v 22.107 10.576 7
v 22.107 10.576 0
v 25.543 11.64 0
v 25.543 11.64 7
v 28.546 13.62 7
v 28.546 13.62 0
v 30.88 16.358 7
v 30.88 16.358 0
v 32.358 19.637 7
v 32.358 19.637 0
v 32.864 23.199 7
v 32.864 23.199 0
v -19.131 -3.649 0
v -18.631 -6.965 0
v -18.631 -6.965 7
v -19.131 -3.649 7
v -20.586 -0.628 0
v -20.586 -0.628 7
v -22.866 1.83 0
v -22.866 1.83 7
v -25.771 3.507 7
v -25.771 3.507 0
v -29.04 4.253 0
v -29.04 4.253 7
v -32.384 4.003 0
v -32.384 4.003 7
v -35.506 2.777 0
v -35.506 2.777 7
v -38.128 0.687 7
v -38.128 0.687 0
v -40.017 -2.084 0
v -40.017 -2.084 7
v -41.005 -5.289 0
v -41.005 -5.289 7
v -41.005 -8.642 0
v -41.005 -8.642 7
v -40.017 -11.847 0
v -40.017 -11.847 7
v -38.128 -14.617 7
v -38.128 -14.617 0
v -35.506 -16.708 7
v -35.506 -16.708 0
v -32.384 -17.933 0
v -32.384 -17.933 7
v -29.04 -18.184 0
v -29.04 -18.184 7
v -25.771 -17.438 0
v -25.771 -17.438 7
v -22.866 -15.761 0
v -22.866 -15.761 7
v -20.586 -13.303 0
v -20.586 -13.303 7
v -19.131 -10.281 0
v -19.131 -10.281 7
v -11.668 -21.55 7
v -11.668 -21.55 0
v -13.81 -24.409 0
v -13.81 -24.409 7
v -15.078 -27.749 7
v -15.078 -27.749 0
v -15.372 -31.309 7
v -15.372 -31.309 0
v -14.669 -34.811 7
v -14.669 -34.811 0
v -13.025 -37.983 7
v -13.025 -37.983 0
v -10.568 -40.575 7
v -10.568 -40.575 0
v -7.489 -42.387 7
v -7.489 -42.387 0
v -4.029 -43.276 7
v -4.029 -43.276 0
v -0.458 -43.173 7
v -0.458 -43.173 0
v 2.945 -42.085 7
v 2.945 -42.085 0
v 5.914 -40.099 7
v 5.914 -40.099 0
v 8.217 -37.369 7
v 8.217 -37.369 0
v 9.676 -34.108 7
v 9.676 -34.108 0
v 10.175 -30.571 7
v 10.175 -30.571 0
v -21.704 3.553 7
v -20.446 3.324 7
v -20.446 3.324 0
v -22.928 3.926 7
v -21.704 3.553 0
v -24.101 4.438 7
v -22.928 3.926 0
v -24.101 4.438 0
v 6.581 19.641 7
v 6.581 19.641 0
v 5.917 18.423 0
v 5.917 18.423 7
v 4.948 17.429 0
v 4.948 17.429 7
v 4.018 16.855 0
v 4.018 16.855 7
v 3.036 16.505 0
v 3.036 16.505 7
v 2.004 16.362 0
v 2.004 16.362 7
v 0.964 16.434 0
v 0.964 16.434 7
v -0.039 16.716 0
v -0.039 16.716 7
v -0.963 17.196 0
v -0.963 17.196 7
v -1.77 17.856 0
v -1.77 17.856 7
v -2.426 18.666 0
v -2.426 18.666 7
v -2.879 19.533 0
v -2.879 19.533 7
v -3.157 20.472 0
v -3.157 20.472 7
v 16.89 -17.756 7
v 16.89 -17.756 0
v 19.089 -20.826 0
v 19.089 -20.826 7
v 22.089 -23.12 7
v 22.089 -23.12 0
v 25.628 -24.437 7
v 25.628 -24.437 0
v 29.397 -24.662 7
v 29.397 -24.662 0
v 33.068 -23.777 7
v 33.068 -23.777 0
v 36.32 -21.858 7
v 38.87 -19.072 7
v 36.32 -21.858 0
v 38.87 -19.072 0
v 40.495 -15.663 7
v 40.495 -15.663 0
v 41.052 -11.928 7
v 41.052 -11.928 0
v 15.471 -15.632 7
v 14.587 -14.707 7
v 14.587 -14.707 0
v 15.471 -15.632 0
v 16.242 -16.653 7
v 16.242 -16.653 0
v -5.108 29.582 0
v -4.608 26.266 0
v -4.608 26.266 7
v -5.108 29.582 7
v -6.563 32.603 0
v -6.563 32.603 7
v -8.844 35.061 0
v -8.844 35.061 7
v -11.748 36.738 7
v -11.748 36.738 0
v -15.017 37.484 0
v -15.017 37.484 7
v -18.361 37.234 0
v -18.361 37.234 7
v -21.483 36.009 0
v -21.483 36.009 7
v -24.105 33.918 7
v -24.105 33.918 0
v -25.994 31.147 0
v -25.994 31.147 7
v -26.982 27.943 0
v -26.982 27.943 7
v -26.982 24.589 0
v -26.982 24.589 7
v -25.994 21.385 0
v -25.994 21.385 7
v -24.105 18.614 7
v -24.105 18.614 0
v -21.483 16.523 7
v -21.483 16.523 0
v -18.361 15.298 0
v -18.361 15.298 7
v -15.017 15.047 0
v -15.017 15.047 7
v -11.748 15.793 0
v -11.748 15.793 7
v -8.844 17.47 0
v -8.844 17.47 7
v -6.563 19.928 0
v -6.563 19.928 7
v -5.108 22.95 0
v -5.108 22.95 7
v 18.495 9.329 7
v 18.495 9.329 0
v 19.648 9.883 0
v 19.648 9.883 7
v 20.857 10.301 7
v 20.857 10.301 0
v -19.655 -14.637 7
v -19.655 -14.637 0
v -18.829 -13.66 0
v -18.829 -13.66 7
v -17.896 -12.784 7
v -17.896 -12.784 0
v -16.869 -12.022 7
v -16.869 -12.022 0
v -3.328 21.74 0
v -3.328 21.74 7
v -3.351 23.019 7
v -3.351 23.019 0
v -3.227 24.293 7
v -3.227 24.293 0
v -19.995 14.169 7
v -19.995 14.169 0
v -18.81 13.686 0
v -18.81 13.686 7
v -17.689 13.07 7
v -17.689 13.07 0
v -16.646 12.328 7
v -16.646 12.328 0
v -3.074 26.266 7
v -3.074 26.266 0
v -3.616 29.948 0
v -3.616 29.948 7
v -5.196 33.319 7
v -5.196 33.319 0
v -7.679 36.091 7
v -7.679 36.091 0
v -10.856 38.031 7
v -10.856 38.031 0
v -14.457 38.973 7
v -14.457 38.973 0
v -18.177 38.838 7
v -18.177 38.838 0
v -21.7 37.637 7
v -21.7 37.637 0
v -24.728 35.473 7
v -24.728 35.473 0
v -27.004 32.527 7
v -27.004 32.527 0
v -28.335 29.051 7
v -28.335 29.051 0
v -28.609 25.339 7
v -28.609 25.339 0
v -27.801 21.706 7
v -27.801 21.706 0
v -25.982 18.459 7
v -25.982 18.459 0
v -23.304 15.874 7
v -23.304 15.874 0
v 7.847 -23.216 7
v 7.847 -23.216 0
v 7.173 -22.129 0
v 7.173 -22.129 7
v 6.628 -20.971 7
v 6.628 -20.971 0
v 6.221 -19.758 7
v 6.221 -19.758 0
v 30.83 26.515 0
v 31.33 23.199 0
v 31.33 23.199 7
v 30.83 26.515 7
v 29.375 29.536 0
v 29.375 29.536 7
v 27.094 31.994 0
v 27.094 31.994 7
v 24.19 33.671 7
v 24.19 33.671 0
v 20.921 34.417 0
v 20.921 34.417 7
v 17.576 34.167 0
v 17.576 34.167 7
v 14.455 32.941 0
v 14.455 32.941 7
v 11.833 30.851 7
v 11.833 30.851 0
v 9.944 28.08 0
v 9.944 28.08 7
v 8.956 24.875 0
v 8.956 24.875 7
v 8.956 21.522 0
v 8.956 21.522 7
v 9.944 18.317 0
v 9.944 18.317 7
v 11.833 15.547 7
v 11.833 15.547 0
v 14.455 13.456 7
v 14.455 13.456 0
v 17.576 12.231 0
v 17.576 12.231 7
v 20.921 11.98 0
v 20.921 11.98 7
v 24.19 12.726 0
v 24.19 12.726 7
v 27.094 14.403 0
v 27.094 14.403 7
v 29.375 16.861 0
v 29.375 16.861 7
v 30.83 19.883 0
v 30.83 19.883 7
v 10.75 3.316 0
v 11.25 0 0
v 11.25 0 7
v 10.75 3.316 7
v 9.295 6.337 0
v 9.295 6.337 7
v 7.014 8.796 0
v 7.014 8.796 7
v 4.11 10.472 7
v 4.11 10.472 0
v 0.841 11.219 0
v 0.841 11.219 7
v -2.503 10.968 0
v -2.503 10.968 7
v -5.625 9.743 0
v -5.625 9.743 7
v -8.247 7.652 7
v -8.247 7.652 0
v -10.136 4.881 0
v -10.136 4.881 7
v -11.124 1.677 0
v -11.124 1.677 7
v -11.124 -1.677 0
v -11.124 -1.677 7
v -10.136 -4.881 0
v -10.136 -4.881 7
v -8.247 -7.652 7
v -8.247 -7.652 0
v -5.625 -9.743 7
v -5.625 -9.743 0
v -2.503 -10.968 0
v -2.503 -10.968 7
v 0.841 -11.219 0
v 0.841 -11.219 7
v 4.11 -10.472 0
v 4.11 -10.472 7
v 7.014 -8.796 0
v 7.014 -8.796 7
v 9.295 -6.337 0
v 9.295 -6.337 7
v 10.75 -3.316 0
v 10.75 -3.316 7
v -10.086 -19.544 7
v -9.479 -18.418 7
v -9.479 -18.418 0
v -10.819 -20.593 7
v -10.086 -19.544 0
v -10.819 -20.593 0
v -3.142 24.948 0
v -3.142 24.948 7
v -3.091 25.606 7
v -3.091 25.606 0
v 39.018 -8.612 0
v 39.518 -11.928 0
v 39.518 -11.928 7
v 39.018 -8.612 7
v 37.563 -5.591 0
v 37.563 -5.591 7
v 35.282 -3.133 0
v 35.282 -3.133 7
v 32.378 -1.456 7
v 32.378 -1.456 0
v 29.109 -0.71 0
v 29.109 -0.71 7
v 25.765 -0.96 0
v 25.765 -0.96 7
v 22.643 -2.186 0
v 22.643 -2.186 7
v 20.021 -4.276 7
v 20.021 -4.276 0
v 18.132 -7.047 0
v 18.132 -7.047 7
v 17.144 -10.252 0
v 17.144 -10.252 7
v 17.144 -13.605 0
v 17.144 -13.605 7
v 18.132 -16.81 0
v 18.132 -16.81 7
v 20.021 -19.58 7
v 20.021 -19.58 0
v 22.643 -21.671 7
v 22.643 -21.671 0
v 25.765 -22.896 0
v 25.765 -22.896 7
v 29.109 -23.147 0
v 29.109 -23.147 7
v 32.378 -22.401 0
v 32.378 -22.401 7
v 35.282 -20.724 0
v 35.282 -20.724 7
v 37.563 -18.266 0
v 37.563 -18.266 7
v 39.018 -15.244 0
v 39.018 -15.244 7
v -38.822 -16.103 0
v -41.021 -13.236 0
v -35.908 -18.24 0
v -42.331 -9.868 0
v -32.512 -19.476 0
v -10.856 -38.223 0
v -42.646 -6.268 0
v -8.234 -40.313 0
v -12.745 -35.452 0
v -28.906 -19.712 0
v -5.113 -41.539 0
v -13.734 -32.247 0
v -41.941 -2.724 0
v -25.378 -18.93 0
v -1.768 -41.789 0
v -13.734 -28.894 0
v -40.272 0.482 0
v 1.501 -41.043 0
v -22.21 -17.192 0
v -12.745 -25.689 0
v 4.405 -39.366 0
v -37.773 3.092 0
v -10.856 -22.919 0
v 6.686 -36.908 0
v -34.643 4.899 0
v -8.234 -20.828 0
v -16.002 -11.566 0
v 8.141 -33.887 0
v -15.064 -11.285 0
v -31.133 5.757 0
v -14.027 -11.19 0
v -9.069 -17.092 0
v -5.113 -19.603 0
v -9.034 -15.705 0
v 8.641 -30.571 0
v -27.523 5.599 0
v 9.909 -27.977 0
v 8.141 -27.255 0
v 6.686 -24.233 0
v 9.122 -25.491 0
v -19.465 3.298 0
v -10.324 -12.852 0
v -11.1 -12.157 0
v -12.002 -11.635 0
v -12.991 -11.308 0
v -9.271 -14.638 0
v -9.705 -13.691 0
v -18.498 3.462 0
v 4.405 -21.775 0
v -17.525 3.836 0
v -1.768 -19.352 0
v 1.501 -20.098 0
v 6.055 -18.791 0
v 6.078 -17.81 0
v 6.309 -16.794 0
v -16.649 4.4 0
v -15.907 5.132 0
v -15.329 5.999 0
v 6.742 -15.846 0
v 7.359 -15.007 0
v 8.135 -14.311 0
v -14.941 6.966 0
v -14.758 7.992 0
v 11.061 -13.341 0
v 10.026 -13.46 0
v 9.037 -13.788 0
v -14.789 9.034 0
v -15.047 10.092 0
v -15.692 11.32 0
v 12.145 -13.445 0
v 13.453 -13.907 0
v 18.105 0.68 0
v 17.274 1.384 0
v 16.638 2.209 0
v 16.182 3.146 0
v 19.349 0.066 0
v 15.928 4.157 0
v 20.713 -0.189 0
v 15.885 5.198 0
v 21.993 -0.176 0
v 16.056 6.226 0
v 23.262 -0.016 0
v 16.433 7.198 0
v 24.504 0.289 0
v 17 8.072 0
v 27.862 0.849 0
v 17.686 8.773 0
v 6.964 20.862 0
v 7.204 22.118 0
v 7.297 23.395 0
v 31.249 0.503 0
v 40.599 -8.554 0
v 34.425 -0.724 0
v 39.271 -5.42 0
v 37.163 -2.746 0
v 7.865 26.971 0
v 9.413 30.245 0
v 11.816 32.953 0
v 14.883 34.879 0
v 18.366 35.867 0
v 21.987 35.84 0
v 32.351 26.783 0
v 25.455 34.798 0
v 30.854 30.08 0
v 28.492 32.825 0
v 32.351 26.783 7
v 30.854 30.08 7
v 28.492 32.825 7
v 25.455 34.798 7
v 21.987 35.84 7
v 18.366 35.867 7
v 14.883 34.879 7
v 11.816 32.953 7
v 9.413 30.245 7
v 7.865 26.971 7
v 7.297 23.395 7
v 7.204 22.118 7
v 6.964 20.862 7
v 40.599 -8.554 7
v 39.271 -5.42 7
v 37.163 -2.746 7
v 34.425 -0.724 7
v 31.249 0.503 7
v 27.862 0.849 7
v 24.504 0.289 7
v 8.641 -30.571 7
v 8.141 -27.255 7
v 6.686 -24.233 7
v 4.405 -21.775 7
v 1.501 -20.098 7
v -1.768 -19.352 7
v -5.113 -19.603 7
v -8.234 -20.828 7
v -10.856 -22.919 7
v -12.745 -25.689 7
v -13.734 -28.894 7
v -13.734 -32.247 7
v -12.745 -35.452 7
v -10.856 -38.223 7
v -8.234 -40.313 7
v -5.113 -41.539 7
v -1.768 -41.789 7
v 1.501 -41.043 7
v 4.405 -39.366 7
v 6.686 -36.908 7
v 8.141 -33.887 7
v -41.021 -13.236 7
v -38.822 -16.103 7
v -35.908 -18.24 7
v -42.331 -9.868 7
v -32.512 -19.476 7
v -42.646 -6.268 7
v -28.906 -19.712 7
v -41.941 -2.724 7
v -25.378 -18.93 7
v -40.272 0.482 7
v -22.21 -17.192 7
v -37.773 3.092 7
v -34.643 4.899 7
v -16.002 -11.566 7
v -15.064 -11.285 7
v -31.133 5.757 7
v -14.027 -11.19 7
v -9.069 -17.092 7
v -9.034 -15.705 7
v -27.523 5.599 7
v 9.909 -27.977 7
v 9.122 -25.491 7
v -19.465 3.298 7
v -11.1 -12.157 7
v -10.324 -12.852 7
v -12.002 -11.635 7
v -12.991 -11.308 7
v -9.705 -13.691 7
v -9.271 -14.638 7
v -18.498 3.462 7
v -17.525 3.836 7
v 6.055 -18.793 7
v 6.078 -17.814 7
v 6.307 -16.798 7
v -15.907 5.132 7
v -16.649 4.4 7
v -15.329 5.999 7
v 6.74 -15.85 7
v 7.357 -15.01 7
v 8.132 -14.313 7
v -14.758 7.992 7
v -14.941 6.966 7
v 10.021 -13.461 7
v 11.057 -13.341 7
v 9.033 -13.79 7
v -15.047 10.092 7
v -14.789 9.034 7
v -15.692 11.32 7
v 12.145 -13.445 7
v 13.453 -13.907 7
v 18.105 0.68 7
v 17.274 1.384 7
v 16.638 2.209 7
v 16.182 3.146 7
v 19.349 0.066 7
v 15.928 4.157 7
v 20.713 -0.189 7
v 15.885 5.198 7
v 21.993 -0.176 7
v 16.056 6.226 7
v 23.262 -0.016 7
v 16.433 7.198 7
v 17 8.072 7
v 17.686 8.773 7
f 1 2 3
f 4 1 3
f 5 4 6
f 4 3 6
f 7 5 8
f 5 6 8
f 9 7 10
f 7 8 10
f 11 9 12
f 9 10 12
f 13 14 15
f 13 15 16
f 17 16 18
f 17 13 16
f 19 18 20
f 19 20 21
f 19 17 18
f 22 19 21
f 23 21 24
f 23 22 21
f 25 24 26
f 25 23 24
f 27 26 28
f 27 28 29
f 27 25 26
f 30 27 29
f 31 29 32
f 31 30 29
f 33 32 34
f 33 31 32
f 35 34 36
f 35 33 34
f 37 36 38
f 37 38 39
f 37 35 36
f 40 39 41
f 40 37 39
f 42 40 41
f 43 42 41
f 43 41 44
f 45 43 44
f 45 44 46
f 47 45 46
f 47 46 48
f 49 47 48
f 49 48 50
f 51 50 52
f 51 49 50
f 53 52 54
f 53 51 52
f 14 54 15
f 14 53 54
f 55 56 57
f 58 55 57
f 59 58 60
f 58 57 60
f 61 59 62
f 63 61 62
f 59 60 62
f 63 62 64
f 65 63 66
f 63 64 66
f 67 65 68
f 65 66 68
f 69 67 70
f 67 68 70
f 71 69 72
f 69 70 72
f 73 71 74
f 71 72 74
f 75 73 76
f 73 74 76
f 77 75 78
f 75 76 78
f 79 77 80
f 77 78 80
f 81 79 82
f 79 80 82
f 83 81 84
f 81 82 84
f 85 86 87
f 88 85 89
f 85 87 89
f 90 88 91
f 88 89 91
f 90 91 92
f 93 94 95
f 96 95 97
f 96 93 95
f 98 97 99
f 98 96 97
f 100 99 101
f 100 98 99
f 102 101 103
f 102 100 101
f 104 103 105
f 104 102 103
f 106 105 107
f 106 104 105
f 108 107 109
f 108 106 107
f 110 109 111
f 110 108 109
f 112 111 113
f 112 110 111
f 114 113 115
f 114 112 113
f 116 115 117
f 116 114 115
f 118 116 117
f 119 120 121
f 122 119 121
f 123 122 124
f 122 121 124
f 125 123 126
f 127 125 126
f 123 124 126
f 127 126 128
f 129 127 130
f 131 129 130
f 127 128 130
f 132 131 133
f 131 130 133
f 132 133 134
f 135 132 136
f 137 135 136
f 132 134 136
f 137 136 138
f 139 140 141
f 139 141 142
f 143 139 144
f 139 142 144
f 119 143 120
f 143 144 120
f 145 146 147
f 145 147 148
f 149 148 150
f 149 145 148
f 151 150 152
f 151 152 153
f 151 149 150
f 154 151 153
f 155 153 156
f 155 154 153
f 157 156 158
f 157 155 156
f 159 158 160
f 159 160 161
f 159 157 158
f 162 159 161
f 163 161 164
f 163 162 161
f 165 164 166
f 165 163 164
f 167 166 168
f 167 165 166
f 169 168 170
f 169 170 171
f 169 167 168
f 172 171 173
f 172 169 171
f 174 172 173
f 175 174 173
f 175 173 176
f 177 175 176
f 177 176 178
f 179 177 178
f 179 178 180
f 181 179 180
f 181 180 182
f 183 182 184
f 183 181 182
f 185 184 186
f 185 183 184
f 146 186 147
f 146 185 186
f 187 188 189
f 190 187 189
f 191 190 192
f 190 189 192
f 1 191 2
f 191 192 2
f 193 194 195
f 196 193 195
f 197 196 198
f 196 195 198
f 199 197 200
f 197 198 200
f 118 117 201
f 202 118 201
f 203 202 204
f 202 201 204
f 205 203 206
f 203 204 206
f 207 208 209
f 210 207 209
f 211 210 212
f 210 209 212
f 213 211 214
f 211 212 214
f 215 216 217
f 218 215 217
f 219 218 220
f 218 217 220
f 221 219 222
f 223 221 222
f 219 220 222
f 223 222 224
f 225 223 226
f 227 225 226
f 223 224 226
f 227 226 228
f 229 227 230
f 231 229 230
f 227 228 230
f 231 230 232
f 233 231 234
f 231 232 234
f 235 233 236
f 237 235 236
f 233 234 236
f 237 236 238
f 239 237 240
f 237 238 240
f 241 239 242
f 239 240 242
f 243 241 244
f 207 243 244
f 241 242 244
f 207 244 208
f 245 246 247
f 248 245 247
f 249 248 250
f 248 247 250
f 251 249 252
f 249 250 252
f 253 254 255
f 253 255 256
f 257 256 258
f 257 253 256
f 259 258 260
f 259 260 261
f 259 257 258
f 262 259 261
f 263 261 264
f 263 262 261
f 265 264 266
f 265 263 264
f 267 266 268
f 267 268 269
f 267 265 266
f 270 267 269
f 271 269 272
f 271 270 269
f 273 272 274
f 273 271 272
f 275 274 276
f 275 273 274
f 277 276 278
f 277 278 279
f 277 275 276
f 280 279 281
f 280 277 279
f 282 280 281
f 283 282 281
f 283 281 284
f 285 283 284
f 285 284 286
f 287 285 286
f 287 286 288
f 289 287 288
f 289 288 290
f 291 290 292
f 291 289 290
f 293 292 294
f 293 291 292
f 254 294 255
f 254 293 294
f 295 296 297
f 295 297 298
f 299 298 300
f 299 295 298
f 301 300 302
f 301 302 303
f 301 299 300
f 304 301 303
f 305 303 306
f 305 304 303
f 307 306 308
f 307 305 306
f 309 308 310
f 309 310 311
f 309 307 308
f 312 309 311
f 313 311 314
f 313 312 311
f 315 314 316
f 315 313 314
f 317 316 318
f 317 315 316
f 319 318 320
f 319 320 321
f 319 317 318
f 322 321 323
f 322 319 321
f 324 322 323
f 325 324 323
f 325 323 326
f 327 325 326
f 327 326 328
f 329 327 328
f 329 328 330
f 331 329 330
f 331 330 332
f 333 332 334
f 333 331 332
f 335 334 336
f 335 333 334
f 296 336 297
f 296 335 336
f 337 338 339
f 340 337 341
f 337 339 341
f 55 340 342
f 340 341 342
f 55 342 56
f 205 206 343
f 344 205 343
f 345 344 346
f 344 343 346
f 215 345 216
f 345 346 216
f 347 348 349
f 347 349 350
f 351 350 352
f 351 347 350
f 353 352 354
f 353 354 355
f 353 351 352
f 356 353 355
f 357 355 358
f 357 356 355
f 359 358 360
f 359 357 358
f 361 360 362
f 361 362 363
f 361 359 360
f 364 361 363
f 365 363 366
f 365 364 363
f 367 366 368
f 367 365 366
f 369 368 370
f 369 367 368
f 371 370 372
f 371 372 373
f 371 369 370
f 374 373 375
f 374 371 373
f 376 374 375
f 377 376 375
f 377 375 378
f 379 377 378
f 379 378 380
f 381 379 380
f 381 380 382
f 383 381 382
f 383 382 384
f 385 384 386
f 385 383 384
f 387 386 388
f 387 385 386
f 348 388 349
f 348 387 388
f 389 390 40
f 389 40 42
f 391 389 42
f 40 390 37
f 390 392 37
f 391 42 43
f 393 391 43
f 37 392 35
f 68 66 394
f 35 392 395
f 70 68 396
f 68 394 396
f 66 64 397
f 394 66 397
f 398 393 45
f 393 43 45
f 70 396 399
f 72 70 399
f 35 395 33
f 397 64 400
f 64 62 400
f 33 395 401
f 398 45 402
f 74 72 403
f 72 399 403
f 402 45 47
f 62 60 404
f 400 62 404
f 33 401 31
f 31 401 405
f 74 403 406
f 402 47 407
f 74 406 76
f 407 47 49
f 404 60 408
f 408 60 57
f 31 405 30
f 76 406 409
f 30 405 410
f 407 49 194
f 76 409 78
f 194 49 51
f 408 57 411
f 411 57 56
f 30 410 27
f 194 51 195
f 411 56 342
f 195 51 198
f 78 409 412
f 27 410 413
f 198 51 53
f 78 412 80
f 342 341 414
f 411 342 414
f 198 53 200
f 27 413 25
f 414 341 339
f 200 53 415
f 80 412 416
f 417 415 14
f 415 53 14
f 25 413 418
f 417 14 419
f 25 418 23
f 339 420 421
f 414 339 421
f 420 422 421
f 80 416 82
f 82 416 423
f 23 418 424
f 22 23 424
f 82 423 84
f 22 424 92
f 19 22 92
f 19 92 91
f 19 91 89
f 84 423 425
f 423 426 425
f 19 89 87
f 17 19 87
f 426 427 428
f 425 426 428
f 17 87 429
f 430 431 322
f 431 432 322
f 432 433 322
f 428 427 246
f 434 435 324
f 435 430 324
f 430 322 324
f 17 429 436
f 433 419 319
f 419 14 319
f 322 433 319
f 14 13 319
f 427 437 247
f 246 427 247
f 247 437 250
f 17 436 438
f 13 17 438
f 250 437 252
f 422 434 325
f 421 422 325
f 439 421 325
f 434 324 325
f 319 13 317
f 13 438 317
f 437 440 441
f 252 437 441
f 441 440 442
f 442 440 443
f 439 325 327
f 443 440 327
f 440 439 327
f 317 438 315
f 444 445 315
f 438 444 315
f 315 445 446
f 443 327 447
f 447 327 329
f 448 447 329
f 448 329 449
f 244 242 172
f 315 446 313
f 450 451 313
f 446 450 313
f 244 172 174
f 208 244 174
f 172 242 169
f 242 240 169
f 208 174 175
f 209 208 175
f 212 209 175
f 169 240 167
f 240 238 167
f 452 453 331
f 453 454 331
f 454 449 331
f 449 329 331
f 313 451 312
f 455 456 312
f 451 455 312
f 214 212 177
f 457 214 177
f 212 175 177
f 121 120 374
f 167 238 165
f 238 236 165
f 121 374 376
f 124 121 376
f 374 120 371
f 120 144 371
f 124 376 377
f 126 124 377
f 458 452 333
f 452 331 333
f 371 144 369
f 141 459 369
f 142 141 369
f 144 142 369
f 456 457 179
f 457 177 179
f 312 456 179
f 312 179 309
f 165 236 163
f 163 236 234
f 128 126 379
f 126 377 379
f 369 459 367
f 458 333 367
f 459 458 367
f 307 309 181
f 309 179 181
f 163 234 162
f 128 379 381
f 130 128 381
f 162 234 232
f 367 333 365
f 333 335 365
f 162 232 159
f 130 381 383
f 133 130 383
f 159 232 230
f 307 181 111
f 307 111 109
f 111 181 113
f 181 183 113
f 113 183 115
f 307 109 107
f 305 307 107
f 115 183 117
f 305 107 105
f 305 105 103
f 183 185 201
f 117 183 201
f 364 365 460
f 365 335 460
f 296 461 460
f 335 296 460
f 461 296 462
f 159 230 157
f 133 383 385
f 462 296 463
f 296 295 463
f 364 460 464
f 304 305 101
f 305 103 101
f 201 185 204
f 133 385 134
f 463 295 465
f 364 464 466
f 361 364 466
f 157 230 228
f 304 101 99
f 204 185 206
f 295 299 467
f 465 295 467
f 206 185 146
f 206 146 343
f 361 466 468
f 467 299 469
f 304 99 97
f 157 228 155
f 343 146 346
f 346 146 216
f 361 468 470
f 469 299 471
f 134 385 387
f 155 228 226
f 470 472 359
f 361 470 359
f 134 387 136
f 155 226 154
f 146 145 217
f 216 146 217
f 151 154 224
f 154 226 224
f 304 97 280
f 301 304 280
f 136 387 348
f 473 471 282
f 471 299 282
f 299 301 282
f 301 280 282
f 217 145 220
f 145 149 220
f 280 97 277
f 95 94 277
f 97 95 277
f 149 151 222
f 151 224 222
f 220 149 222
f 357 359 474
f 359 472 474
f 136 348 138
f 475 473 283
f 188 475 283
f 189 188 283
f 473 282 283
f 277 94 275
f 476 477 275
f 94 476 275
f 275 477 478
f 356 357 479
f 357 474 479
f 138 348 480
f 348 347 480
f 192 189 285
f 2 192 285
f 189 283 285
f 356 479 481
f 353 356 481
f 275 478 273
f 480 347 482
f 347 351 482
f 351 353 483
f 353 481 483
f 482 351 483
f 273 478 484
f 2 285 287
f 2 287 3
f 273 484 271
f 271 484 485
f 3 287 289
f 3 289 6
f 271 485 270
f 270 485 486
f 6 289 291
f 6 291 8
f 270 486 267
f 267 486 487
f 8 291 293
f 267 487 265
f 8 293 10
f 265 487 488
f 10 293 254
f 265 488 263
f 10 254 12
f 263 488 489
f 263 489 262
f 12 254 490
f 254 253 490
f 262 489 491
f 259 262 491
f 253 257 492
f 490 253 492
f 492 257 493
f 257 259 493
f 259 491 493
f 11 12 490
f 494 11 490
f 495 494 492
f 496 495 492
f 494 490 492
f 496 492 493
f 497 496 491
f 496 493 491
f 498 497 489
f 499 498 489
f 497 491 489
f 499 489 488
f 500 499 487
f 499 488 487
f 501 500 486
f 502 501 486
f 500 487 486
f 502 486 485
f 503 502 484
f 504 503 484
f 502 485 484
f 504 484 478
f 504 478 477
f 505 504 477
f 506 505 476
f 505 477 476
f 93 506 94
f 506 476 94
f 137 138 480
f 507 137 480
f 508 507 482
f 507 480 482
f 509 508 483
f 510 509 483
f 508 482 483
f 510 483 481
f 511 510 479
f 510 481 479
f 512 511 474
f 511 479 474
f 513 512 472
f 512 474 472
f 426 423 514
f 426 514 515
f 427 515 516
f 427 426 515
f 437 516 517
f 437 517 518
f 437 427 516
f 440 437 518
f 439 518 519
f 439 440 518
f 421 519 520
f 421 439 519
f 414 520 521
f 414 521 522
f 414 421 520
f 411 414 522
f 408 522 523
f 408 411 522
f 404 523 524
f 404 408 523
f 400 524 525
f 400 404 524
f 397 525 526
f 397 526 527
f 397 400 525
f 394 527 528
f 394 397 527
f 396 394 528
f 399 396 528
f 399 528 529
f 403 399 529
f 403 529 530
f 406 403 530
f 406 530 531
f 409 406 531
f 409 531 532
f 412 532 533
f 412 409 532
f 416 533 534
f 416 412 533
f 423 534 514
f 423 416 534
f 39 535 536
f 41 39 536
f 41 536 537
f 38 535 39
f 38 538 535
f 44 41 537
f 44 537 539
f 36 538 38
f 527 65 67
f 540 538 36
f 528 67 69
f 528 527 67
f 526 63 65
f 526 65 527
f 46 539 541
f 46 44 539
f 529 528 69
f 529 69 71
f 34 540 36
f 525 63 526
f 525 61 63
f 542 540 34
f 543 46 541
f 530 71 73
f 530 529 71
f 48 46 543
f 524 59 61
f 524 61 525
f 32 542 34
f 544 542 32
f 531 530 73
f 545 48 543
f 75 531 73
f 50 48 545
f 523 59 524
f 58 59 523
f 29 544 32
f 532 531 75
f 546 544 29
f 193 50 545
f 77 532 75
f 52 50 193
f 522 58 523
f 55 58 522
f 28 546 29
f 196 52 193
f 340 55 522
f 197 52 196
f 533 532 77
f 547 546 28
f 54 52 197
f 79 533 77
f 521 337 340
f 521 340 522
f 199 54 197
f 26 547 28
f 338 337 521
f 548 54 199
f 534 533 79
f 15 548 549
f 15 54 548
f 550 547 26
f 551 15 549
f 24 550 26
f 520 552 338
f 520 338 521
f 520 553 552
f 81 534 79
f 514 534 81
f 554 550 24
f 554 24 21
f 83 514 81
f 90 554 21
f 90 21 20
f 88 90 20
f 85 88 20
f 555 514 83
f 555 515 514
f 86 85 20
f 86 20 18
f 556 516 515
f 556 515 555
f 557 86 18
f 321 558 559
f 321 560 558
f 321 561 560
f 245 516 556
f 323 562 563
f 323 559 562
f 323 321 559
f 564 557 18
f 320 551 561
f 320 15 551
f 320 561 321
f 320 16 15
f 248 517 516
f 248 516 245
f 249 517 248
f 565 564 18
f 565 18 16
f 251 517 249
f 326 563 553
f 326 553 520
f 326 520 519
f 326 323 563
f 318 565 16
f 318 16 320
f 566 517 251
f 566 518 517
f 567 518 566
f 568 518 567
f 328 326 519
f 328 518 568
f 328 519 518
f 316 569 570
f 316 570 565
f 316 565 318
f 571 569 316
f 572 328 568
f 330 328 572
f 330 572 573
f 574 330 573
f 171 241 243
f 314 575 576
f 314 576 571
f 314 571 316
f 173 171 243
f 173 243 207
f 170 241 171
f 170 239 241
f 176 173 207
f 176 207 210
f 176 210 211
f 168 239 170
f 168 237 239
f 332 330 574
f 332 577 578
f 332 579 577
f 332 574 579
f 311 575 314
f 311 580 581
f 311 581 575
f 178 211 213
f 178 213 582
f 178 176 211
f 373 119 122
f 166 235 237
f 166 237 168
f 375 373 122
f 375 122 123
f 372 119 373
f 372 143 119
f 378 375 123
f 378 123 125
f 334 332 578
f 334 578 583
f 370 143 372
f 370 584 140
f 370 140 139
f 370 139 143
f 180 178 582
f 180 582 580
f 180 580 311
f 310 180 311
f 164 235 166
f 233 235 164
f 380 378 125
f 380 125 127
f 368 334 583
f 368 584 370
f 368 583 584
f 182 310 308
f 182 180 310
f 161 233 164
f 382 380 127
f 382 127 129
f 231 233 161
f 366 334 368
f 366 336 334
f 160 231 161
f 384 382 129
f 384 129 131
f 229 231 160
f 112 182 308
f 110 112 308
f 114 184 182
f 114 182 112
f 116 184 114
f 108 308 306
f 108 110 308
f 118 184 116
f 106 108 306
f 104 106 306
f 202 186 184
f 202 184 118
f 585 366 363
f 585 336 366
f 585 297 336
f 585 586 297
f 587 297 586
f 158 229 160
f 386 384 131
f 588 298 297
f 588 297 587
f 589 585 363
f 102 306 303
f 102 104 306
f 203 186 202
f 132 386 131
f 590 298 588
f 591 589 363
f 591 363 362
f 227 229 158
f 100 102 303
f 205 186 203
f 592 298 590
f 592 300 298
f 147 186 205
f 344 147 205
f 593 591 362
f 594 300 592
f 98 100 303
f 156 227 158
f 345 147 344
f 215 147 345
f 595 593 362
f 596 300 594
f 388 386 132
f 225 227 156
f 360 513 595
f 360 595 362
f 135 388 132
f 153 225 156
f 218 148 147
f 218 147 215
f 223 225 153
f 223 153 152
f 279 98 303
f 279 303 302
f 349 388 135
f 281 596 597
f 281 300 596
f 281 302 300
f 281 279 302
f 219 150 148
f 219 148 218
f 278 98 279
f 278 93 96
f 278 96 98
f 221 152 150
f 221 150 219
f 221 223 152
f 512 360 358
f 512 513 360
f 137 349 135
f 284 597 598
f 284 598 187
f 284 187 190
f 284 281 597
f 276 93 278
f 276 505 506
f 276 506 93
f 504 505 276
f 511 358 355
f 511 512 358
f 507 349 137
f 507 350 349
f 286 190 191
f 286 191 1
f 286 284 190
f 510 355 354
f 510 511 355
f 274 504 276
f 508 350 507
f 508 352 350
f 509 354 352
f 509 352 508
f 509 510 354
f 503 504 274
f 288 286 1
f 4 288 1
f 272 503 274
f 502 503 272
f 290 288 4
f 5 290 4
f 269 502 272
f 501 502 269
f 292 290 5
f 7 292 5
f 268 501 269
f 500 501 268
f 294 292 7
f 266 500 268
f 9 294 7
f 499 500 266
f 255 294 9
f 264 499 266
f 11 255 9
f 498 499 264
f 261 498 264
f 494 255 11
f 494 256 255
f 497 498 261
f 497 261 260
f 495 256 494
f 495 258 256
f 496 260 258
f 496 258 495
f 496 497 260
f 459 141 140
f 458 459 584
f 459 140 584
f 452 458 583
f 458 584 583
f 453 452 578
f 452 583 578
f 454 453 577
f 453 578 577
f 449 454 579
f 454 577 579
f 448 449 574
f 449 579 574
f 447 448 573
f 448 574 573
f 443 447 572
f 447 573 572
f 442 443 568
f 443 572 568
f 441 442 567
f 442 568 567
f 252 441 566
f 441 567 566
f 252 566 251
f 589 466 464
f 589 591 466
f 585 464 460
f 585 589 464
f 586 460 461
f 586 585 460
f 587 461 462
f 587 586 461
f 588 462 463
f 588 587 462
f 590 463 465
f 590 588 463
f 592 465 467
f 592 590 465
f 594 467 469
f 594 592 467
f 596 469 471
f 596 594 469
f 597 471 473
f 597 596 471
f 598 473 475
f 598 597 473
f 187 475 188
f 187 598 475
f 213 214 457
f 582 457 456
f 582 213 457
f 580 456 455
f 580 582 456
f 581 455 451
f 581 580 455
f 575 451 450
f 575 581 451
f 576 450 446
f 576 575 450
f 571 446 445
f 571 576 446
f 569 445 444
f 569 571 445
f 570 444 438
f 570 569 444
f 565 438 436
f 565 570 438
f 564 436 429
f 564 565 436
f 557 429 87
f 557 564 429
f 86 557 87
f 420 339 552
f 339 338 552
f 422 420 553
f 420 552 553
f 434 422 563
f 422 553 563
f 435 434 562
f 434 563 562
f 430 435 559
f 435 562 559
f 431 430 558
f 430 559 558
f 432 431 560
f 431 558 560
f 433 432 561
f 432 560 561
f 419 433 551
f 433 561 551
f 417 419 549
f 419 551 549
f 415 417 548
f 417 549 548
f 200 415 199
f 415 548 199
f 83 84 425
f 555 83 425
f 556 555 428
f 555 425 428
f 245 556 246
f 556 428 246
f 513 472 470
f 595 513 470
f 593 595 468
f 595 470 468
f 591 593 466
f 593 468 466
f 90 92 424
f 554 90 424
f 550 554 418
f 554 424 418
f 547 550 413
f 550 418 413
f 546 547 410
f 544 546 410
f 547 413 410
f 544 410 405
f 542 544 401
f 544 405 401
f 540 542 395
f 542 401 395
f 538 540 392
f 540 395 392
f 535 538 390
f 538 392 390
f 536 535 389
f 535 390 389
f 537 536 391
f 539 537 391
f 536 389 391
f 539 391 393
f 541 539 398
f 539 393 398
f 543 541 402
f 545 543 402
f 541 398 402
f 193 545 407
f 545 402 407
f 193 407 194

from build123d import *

# Parameters (mm, degrees)
F0_R     = 11.25
F1_DEPTH = 7
F2_R     = 5.08


# Not quite as in the source:
# - a feature names something its author has since deleted; it is built from what else it names


with BuildPart() as f1:
    # F0 (on Top) → F1 (new body)
    with BuildSketch(Plane.XY):
        with BuildLine():
            ThreePointArc((-10.2261463935, 7.6719560941), (-6.6075524932, 10.9440956877), (-2.0266855863, 12.6224215548))
            ThreePointArc((-2.0266855863, 12.6224215548), (-0.3918821811, 13.0140427744), (1.1648785444, 13.648428617))
            ThreePointArc((1.1648785444, 13.648428617), (-2.5221716271, 18.3553828089), (-3.2272094242, 24.2927794132))
            ThreePointArc((-3.2272094242, 24.2927794132), (-9.2505734905, 15.3217339628), (-19.9945367973, 14.1694216731))
            ThreePointArc((-19.9945367973, 14.1694216731), (-15.0686816006, 10.7803646784), (-12.6204597068, 5.3254617195))
            ThreePointArc((-12.6204597068, 5.3254617195), (-11.3340606288, 6.4076478244), (-10.2261463935, 7.6719560941))
        make_face()
        with BuildLine():
            ThreePointArc((12.7825888677, -0.1959648224), (12.7837153932, -0.0979852894), (12.7840909091, 0))
            ThreePointArc((12.7840909091, 0), (12.4276891989, 2.9975859532), (11.3783559826, 5.828035304))
            ThreePointArc((11.3783559826, 5.828035304), (8.3666075071, 9.666067411), (4.1364108135, 12.0964079773))
            ThreePointArc((4.1364108135, 12.0964079773), (1.0871557866, 12.7377813087), (-2.0266855863, 12.6224215548))
            ThreePointArc((-2.0266855863, 12.6224215548), (-6.6075524932, 10.9440956877), (-10.2261463935, 7.6719560941))
            ThreePointArc((-10.2261463935, 7.6719560941), (-11.7784003031, 4.9701374901), (-12.6309165595, 1.9730502372))
            ThreePointArc((-12.6309165595, 1.9730502372), (-12.4502995304, -2.9022442999), (-10.4565168586, -7.3548783509))
            ThreePointArc((-10.4565168586, -7.3548783509), (-8.3666075071, -9.666067411), (-5.7796501565, -11.4030094467))
            ThreePointArc((-5.7796501565, -11.4030094467), (-1.0871557866, -12.7377813087), (3.7636635709, -12.2175208981))
            ThreePointArc((3.7636635709, -12.2175208981), (6.6075524932, -10.9440956877), (9.0588963197, -9.0204976493))
            ThreePointArc((9.0588963197, -9.0204976493), (11.7784003031, -4.9701374901), (12.7825888677, -0.1959648224))
        make_face()
        Circle(F0_R, mode=Mode.SUBTRACT)
        with BuildLine():
            ThreePointArc((-2.0266855863, 12.6224215548), (1.0871557866, 12.7377813087), (4.1364108135, 12.0964079773))
            ThreePointArc((4.1364108135, 12.0964079773), (2.591617868, 12.7594042888), (1.1648785444, 13.648428617))
            ThreePointArc((1.1648785444, 13.648428617), (-0.3918821811, 13.0140427744), (-2.0266855863, 12.6224215548))
        make_face()
        with BuildLine():
            ThreePointArc((11.3783559826, 5.828035304), (12.4276891989, 2.9975859532), (12.7840909091, 0))
            ThreePointArc((12.7840909091, 0), (12.7837153932, -0.0979852894), (12.7825888677, -0.1959648224))
            ThreePointArc((12.7825888677, -0.1959648224), (12.935768557, 1.4780977023), (13.34039424, 3.1097310588))
            ThreePointArc((13.34039424, 3.1097310588), (12.2559919302, 4.3942624848), (11.3783559826, 5.828035304))
        make_face()
        with BuildLine():
            ThreePointArc((-12.6309165595, 1.9730502372), (-11.7784003031, 4.9701374901), (-10.2261463935, 7.6719560941))
            ThreePointArc((-10.2261463935, 7.6719560941), (-11.3340606288, 6.4076478244), (-12.6204597068, 5.3254617195))
            ThreePointArc((-12.6204597068, 5.3254617195), (-12.4981884377, 3.6488582809), (-12.6309165595, 1.9730502372))
        make_face()
        with BuildLine():
            ThreePointArc((-10.4565168586, -7.3548783509), (-12.4502995304, -2.9022442999), (-12.6309165595, 1.9730502372))
            ThreePointArc((-12.6309165595, 1.9730502372), (-12.4981884377, 3.6488582809), (-12.6204597068, 5.3254617195))
            ThreePointArc((-12.6204597068, 5.3254617195), (-18.236400325, 3.273397465), (-24.1010687164, 4.4376231269))
            ThreePointArc((-24.1010687164, 4.4376231269), (-18.9875890794, -0.2741455025), (-17.0966279638, -6.9653863197))
            ThreePointArc((-17.0966279638, -6.9653863197), (-17.7529621653, -11.0089611755), (-19.6545724794, -14.6373424139))
            ThreePointArc((-19.6545724794, -14.6373424139), (-14.9092147728, -10.999851937), (-8.9647515968, -10.3571122686))
            ThreePointArc((-8.9647515968, -10.3571122686), (-9.5964525671, -8.7992601454), (-10.4565168586, -7.3548783509))
        make_face()
        with BuildLine():
            ThreePointArc((4.1364108135, 12.0964079773), (8.3666075071, 9.666067411), (11.3783559826, 5.828035304))
            ThreePointArc((11.3783559826, 5.828035304), (12.2559919302, 4.3942624848), (13.34039424, 3.1097310588))
            ThreePointArc((13.34039424, 3.1097310588), (16.677612534, 8.0708529874), (22.1065436034, 10.5761402317))
            ThreePointArc((22.1065436034, 10.5761402317), (11.7132505099, 13.5324943754), (7.2972691493, 23.3945266088))
            ThreePointArc((7.2972691493, 23.3945266088), (5.596257378, 17.6624837194), (1.1648785444, 13.648428617))
            ThreePointArc((1.1648785444, 13.648428617), (2.591617868, 12.7594042888), (4.1364108135, 12.0964079773))
        make_face()
        with BuildLine():
            ThreePointArc((13.34039424, 3.1097310588), (12.935768557, 1.4780977023), (12.7825888677, -0.1959648224))
            ThreePointArc((12.7825888677, -0.1959648224), (11.7784003031, -4.9701374901), (9.0588963197, -9.0204976493))
            ThreePointArc((9.0588963197, -9.0204976493), (7.9665017598, -10.2982392034), (7.0799385192, -11.7265091268))
            ThreePointArc((7.0799385192, -11.7265091268), (12.8295030243, -13.3673213445), (16.8898047449, -17.7563652803))
            ThreePointArc((16.8898047449, -17.7563652803), (16.4897604244, -6.9581924862), (24.5044971566, 0.2891909218))
            ThreePointArc((24.5044971566, 0.2891909218), (18.52735887, 0.1356505859), (13.34039424, 3.1097310588))
        make_face()
        with BuildLine():
            ThreePointArc((7.0799385192, -11.7265091268), (7.9665017598, -10.2982392034), (9.0588963197, -9.0204976493))
            ThreePointArc((9.0588963197, -9.0204976493), (6.6075524932, -10.9440956877), (3.7636635709, -12.2175208981))
            ThreePointArc((3.7636635709, -12.2175208981), (5.4031267709, -11.8458896701), (7.0799385192, -11.7265091268))
        make_face()
        with BuildLine():
            ThreePointArc((-8.9647515968, -10.3571122686), (-7.3324230712, -10.7589243367), (-5.7796501565, -11.4030094467))
            ThreePointArc((-5.7796501565, -11.4030094467), (-8.3666075071, -9.666067411), (-10.4565168586, -7.3548783509))
            ThreePointArc((-10.4565168586, -7.3548783509), (-9.5964525671, -8.7992601454), (-8.9647515968, -10.3571122686))
        make_face()
        with BuildLine():
            ThreePointArc((7.0799385192, -11.7265091268), (5.4031267709, -11.8458896701), (3.7636635709, -12.2175208981))
            ThreePointArc((3.7636635709, -12.2175208981), (-1.0871557866, -12.7377813087), (-5.7796501565, -11.4030094467))
            ThreePointArc((-5.7796501565, -11.4030094467), (-7.3324230712, -10.7589243367), (-8.9647515968, -10.3571122686))
            ThreePointArc((-8.9647515968, -10.3571122686), (-8.7485436062, -16.3323119169), (-11.6680702077, -21.5501774915))
            ThreePointArc((-11.6680702077, -21.5501774915), (-1.5220181013, -17.8328938321), (7.8473429707, -23.2157967899))
            ThreePointArc((7.8473429707, -23.2157967899), (5.8542801254, -17.5786470467), (7.0799385192, -11.7265091268))
        make_face()
        with BuildLine():
            ThreePointArc((41.0522516366, -11.9283299763), (35.8615118695, -1.64368128), (24.5044971566, 0.2891909218))
            ThreePointArc((24.5044971566, 0.2891909218), (16.4897604244, -6.9581924862), (16.8898047449, -17.7563652803))
            ThreePointArc((16.8898047449, -17.7563652803), (31.2657466808, -24.3560191752), (41.0522516366, -11.9283299763))
        make_face()
        with Locations((28.2681607275, -11.9283299763)):
            Circle(F0_R, mode=Mode.SUBTRACT)
        with BuildLine():
            ThreePointArc((10.1749170211, -30.5706751408), (9.5791410589, -26.713479381), (7.8473429707, -23.2157967899))
            ThreePointArc((7.8473429707, -23.2157967899), (-1.5220181013, -17.8328938321), (-11.6680702077, -21.5501774915))
            ThreePointArc((-11.6680702077, -21.5501774915), (-7.4888883409, -42.3868237193), (10.1749170211, -30.5706751408))
        make_face()
        with Locations((-2.6091738879, -30.5706751408)):
            Circle(F0_R, mode=Mode.SUBTRACT)
        with BuildLine():
            ThreePointArc((-17.0966279638, -6.9653863197), (-18.9875890794, -0.2741455025), (-24.1010687164, 4.4376231269))
            ThreePointArc((-24.1010687164, 4.4376231269), (-42.3310184032, -9.8676306196), (-19.6545724794, -14.6373424139))
            ThreePointArc((-19.6545724794, -14.6373424139), (-17.7529621653, -11.0089611755), (-17.0966279638, -6.9653863197))
        make_face()
        with Locations((-29.8807188729, -6.9653863197)):
            Circle(F0_R, mode=Mode.SUBTRACT)
        with BuildLine():
            ThreePointArc((-19.9945367973, 14.1694216731), (-9.2505734905, 15.3217339628), (-3.2272094242, 24.2927794132))
            ThreePointArc((-3.2272094242, 24.2927794132), (-3.112386187, 25.2763361411), (-3.0740350747, 26.2658296504))
            ThreePointArc((-3.0740350747, 26.2658296504), (-23.2929335971, 36.6656669628), (-19.9945367973, 14.1694216731))
        make_face()
        with Locations((-15.8581259838, 26.2658296504)):
            Circle(F0_R, mode=Mode.SUBTRACT)
        with BuildLine():
            ThreePointArc((7.2972691493, 23.3945266088), (11.7132505099, 13.5324943754), (22.1065436034, 10.5761402317))
            ThreePointArc((22.1065436034, 10.5761402317), (29.8097684265, 14.9062868395), (32.8639489261, 23.1985617864))
            ThreePointArc((32.8639489261, 23.1985617864), (20.1778433064, 35.9822771796), (7.2972691493, 23.3945266088))
        make_face()
        with Locations((20.079858017, 23.1985617864)):
            Circle(F0_R, mode=Mode.SUBTRACT)
    extrude(amount=F1_DEPTH)

    # F2
    f2_edges = [f1.edges().sort_by_distance(p)[0] for p in [
        (7.079939, -11.726509, 3.5),
        (-8.964752, -10.357112, 3.5),
        (-12.62046, 5.325462, 3.5),
        (1.164879, 13.648429, 3.5),
        (13.340394, 3.109731, 3.5),
    ]]
    fillet(f2_edges, radius=F2_R)


solid = f1.part
